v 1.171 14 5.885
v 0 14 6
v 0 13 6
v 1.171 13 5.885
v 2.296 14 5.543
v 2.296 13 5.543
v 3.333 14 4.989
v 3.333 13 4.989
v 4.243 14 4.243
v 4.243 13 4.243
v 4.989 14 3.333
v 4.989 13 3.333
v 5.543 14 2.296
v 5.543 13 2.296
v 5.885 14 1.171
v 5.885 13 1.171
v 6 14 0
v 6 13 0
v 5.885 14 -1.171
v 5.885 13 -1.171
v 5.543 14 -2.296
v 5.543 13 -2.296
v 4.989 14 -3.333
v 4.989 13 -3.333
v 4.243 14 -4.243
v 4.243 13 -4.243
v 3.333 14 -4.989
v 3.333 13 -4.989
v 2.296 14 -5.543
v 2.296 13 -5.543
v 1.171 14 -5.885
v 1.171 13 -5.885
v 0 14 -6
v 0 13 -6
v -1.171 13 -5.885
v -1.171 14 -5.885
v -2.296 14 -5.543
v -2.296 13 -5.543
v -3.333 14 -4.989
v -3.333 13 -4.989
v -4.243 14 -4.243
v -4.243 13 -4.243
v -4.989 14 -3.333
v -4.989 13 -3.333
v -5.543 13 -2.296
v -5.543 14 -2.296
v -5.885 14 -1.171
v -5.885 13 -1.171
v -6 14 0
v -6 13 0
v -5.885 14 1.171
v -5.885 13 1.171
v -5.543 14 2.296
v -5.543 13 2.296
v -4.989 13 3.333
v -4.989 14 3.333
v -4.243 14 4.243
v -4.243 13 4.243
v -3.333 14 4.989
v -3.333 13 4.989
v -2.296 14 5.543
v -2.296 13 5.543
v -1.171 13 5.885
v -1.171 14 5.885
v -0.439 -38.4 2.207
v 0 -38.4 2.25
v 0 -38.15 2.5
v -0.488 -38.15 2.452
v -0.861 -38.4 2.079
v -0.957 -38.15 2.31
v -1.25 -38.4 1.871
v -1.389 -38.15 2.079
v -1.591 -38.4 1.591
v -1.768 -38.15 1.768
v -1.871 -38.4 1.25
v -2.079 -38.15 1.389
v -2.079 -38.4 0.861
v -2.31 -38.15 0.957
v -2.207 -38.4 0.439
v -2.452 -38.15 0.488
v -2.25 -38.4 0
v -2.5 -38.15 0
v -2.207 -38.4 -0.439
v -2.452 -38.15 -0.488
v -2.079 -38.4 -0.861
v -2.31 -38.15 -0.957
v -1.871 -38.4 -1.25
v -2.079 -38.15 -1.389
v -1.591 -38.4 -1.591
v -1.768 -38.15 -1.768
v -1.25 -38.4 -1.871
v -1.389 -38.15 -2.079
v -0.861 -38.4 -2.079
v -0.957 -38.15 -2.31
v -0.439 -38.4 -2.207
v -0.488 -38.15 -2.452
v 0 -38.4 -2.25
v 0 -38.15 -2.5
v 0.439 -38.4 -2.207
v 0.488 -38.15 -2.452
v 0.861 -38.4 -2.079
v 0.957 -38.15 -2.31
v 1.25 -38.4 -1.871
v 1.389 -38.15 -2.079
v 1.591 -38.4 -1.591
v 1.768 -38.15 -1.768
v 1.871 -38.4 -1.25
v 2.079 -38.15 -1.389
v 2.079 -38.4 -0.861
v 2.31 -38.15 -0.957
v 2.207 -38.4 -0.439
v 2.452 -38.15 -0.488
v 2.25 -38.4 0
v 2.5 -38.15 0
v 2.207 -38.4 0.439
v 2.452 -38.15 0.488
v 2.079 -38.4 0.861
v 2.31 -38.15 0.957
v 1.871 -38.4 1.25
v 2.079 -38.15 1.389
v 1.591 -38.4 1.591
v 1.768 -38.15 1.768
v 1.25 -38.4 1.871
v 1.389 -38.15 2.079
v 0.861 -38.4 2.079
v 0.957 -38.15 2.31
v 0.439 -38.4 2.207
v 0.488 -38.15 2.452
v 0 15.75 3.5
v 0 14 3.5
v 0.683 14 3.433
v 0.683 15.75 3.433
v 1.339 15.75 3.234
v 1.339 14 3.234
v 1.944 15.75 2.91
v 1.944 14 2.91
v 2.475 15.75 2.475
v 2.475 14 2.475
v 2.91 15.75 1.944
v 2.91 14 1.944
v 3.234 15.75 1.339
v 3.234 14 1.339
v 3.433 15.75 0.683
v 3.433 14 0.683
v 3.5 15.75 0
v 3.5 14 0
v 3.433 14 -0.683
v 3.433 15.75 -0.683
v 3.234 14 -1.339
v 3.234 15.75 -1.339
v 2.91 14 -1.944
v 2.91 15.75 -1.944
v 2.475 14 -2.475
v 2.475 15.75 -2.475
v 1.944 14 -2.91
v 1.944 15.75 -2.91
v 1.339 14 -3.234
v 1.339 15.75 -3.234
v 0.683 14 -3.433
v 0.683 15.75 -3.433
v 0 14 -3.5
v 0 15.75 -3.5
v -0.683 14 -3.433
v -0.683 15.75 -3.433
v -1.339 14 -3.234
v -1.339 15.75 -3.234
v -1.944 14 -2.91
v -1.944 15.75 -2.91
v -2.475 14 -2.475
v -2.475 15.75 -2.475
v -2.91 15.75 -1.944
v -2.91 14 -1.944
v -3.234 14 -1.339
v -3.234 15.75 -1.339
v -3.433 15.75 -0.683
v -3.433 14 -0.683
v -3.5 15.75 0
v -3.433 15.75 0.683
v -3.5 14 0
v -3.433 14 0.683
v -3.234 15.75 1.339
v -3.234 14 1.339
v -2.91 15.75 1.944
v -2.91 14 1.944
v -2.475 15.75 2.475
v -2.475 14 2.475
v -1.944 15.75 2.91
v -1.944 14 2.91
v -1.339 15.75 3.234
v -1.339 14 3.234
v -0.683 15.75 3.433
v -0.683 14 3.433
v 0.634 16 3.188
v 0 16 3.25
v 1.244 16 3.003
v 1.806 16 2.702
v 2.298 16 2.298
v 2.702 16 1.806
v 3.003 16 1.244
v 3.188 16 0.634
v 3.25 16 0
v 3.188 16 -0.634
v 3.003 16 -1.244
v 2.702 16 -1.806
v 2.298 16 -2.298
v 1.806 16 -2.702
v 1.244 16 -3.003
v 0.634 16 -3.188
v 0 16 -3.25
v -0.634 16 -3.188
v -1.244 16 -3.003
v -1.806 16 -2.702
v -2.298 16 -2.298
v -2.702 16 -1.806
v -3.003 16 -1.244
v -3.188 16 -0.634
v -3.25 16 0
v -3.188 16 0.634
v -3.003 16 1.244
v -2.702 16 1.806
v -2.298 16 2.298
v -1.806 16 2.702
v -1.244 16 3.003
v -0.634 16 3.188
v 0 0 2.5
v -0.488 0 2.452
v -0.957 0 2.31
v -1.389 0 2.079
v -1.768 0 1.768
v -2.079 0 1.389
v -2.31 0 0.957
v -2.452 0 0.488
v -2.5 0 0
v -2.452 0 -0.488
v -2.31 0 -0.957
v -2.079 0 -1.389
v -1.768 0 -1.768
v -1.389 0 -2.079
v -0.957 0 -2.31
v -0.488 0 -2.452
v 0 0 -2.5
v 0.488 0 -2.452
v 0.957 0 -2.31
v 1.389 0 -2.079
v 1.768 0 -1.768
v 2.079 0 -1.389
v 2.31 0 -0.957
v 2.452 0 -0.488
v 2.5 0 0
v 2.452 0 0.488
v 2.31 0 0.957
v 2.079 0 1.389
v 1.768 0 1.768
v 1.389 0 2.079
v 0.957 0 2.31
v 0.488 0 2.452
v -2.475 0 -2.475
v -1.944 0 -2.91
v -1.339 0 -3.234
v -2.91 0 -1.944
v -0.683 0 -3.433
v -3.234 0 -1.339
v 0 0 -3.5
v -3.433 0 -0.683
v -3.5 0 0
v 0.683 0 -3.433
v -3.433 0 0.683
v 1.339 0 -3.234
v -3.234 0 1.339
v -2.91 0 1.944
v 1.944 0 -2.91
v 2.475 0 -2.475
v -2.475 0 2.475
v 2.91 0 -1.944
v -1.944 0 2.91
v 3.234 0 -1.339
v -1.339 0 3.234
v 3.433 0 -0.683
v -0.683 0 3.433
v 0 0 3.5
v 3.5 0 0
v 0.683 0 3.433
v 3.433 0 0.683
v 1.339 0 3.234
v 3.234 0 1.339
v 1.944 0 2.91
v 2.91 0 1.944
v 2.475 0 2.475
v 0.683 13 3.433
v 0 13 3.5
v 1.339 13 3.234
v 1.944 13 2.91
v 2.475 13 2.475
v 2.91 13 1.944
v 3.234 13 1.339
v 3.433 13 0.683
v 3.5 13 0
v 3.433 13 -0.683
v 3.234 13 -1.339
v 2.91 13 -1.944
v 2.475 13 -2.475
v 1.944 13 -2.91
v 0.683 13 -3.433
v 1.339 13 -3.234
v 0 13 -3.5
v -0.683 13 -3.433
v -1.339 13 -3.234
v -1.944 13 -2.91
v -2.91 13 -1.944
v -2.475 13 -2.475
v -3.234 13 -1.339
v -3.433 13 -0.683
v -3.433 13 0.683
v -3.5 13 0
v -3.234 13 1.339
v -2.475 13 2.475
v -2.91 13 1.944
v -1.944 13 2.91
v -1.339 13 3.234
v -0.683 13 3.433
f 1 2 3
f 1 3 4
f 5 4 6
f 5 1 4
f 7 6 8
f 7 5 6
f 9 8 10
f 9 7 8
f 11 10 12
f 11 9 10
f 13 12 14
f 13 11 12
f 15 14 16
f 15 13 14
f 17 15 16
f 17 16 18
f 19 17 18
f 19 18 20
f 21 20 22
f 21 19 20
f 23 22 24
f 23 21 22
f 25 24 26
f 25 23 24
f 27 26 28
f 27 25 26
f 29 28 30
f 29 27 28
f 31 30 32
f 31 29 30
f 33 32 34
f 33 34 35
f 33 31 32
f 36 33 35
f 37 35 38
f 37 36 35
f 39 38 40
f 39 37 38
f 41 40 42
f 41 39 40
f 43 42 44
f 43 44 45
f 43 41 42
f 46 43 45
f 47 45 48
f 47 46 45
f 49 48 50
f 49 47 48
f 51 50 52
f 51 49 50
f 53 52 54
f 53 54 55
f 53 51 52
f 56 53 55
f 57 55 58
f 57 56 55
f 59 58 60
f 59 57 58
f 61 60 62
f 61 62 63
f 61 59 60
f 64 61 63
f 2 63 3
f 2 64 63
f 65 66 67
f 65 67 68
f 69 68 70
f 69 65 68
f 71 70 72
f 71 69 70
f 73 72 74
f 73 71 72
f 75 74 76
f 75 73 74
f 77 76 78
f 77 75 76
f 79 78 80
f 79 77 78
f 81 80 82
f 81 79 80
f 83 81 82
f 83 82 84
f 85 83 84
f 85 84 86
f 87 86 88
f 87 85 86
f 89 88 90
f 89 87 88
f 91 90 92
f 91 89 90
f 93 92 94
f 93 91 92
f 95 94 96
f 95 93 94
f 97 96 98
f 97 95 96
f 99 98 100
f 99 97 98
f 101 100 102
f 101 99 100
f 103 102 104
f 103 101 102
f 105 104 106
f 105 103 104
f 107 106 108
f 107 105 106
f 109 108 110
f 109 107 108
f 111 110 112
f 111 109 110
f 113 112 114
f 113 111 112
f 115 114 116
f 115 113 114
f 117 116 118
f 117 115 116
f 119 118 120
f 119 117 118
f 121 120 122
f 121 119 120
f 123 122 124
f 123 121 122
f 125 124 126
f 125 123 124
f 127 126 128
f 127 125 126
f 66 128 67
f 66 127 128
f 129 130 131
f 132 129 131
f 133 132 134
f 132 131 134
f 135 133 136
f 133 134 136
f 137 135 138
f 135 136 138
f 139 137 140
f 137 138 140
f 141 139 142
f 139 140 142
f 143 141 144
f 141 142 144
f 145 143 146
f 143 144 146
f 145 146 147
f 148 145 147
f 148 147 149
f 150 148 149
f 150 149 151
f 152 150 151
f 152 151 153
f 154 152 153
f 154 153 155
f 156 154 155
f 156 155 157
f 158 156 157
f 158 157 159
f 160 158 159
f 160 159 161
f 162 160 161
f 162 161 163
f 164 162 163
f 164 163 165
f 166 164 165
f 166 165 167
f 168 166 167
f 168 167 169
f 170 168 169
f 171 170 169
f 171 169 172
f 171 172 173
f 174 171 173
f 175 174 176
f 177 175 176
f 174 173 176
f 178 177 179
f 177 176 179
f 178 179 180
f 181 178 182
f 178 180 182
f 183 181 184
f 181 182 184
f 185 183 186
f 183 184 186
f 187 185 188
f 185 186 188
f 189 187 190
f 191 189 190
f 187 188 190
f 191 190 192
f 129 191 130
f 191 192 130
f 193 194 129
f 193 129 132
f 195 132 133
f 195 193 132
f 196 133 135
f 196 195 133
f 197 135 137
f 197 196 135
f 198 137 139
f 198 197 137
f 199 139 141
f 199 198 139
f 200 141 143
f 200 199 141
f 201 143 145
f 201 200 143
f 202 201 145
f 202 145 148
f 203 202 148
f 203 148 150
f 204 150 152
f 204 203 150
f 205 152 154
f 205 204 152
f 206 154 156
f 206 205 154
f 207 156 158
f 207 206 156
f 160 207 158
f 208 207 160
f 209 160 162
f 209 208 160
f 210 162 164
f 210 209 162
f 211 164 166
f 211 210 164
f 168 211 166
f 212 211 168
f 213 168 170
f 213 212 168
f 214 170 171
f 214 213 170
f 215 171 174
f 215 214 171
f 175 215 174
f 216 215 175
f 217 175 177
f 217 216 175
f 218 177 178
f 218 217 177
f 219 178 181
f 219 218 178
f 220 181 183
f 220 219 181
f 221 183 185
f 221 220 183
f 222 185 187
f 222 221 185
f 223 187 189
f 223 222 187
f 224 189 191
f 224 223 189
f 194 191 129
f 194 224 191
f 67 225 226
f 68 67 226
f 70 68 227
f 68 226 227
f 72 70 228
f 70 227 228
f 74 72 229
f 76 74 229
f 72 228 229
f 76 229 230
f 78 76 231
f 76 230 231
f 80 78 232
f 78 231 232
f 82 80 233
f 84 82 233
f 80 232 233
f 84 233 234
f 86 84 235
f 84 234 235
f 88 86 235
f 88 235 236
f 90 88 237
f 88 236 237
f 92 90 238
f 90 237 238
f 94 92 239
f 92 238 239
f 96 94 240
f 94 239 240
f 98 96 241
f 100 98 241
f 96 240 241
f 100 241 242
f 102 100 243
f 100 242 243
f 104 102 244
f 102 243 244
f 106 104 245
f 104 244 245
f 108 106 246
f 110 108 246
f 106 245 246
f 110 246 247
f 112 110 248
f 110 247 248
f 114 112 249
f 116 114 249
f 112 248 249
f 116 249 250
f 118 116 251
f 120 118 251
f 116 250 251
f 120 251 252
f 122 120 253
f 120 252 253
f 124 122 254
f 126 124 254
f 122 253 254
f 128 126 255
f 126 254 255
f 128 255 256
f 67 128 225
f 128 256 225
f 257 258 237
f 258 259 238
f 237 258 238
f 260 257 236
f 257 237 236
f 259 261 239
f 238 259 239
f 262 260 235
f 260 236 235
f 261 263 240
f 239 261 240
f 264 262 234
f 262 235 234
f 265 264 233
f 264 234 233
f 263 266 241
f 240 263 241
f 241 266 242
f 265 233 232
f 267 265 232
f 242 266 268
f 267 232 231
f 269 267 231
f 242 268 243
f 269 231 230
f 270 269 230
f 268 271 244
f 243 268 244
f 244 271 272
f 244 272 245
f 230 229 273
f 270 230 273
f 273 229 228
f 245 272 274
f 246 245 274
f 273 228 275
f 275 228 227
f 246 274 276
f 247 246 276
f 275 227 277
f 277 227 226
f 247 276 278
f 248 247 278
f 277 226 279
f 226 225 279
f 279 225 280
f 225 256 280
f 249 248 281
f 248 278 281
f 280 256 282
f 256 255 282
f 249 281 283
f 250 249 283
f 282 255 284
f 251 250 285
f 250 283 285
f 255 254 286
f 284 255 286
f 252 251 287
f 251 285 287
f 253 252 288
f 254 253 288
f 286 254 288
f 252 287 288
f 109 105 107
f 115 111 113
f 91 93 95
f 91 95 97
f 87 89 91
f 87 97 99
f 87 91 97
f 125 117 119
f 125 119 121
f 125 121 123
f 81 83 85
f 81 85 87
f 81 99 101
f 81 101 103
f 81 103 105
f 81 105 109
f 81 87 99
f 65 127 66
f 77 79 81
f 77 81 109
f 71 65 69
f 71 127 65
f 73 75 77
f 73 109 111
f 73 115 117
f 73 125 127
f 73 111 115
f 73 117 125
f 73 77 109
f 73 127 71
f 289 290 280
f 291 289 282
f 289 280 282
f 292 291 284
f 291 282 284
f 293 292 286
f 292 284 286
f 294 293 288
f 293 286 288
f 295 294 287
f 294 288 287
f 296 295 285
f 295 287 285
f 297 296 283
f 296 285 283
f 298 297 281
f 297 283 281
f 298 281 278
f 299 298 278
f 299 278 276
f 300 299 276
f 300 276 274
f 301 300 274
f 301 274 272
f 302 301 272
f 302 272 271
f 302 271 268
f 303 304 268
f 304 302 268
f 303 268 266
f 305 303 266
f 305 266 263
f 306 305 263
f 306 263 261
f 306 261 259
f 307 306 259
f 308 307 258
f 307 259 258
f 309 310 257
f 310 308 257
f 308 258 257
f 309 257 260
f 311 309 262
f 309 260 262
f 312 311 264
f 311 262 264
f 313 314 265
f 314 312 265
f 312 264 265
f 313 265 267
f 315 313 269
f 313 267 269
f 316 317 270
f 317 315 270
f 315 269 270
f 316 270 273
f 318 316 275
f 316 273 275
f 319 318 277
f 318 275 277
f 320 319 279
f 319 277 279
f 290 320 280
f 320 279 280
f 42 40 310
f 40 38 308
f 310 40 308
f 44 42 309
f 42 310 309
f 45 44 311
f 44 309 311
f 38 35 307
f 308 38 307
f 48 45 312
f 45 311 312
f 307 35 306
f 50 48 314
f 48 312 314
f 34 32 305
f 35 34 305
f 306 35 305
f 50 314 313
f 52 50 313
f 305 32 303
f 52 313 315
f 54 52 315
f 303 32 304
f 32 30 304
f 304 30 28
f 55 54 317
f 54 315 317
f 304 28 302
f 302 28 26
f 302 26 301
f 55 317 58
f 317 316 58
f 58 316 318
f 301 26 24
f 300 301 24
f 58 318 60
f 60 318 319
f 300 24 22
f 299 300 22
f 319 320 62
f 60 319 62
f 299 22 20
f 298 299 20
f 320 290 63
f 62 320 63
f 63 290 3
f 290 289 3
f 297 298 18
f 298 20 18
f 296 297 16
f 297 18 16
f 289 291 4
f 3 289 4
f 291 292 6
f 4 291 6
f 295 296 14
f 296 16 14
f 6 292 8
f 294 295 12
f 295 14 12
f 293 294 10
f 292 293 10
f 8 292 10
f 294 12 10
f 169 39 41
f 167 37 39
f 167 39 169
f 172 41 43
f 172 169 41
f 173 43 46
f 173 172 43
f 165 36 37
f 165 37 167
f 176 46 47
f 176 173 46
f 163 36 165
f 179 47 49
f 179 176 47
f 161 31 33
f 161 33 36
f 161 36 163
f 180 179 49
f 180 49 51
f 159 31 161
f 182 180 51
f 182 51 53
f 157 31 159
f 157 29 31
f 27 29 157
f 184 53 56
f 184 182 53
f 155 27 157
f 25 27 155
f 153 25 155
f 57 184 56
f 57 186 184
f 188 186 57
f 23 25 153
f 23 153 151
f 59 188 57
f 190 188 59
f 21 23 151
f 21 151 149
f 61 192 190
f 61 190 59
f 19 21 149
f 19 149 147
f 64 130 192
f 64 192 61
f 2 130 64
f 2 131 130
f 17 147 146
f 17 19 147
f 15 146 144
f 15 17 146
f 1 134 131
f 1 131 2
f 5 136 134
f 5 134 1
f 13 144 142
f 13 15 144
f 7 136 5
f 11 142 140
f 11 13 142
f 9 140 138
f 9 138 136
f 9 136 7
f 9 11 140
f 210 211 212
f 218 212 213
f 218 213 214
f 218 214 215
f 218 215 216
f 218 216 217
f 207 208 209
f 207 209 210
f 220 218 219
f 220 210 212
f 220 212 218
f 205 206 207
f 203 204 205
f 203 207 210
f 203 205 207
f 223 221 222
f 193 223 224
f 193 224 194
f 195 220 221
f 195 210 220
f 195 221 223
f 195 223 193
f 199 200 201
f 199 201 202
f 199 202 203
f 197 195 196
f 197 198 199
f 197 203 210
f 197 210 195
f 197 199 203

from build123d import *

# Parameters (mm, degrees)
SKETCH2_R           = 3.5
BOSS_EXTRUDE1_DEPTH = 16
CHAMFER1_SIZE       = 0.25
SKETCH3_R           = 2.5
BOSS_EXTRUDE2_DEPTH = 38.4
CHAMFER2_SIZE       = 0.25
SKETCH4_R           = 6
BOSS_EXTRUDE3_DEPTH = 1


with BuildPart() as part:
    # Sketch2 → Boss-Extrude1 (new body)
    with BuildSketch(Plane(origin=(0, 0, 0), x_dir=(1, 0, 0), z_dir=(0, 1, 0))):
        with Locations(Location((0, 0, 0), (0, 0, 270))):
            Circle(SKETCH2_R)
    extrude(amount=BOSS_EXTRUDE1_DEPTH)

    # Chamfer1
    chamfer1_edges = [part.edges().sort_by_distance(p)[0] for p in [
        (0, 16, -3.5),
    ]]
    chamfer(chamfer1_edges, length=CHAMFER1_SIZE)

    # Sketch3 → Boss-Extrude2 (add)
    with BuildSketch(Plane.XZ):
        with Locations(Location((0, 0, 0), (0, 0, 90))):
            Circle(SKETCH3_R)
    extrude(amount=BOSS_EXTRUDE2_DEPTH)

    # Chamfer2
    chamfer2_edges = [part.edges().sort_by_distance(p)[0] for p in [
        (0, -38.4, -2.5),
    ]]
    chamfer(chamfer2_edges, length=CHAMFER2_SIZE)

    # Sketch4 → Boss-Extrude3 (add)
    with BuildSketch(Plane(origin=(0, 14, 0), x_dir=(1, 0, 0), z_dir=(0, 1, 0))):
        with Locations(Location((0, 0, 0), (0, 0, 270))):
            Circle(SKETCH4_R)
    extrude(amount=-BOSS_EXTRUDE3_DEPTH)


solid = part.part
